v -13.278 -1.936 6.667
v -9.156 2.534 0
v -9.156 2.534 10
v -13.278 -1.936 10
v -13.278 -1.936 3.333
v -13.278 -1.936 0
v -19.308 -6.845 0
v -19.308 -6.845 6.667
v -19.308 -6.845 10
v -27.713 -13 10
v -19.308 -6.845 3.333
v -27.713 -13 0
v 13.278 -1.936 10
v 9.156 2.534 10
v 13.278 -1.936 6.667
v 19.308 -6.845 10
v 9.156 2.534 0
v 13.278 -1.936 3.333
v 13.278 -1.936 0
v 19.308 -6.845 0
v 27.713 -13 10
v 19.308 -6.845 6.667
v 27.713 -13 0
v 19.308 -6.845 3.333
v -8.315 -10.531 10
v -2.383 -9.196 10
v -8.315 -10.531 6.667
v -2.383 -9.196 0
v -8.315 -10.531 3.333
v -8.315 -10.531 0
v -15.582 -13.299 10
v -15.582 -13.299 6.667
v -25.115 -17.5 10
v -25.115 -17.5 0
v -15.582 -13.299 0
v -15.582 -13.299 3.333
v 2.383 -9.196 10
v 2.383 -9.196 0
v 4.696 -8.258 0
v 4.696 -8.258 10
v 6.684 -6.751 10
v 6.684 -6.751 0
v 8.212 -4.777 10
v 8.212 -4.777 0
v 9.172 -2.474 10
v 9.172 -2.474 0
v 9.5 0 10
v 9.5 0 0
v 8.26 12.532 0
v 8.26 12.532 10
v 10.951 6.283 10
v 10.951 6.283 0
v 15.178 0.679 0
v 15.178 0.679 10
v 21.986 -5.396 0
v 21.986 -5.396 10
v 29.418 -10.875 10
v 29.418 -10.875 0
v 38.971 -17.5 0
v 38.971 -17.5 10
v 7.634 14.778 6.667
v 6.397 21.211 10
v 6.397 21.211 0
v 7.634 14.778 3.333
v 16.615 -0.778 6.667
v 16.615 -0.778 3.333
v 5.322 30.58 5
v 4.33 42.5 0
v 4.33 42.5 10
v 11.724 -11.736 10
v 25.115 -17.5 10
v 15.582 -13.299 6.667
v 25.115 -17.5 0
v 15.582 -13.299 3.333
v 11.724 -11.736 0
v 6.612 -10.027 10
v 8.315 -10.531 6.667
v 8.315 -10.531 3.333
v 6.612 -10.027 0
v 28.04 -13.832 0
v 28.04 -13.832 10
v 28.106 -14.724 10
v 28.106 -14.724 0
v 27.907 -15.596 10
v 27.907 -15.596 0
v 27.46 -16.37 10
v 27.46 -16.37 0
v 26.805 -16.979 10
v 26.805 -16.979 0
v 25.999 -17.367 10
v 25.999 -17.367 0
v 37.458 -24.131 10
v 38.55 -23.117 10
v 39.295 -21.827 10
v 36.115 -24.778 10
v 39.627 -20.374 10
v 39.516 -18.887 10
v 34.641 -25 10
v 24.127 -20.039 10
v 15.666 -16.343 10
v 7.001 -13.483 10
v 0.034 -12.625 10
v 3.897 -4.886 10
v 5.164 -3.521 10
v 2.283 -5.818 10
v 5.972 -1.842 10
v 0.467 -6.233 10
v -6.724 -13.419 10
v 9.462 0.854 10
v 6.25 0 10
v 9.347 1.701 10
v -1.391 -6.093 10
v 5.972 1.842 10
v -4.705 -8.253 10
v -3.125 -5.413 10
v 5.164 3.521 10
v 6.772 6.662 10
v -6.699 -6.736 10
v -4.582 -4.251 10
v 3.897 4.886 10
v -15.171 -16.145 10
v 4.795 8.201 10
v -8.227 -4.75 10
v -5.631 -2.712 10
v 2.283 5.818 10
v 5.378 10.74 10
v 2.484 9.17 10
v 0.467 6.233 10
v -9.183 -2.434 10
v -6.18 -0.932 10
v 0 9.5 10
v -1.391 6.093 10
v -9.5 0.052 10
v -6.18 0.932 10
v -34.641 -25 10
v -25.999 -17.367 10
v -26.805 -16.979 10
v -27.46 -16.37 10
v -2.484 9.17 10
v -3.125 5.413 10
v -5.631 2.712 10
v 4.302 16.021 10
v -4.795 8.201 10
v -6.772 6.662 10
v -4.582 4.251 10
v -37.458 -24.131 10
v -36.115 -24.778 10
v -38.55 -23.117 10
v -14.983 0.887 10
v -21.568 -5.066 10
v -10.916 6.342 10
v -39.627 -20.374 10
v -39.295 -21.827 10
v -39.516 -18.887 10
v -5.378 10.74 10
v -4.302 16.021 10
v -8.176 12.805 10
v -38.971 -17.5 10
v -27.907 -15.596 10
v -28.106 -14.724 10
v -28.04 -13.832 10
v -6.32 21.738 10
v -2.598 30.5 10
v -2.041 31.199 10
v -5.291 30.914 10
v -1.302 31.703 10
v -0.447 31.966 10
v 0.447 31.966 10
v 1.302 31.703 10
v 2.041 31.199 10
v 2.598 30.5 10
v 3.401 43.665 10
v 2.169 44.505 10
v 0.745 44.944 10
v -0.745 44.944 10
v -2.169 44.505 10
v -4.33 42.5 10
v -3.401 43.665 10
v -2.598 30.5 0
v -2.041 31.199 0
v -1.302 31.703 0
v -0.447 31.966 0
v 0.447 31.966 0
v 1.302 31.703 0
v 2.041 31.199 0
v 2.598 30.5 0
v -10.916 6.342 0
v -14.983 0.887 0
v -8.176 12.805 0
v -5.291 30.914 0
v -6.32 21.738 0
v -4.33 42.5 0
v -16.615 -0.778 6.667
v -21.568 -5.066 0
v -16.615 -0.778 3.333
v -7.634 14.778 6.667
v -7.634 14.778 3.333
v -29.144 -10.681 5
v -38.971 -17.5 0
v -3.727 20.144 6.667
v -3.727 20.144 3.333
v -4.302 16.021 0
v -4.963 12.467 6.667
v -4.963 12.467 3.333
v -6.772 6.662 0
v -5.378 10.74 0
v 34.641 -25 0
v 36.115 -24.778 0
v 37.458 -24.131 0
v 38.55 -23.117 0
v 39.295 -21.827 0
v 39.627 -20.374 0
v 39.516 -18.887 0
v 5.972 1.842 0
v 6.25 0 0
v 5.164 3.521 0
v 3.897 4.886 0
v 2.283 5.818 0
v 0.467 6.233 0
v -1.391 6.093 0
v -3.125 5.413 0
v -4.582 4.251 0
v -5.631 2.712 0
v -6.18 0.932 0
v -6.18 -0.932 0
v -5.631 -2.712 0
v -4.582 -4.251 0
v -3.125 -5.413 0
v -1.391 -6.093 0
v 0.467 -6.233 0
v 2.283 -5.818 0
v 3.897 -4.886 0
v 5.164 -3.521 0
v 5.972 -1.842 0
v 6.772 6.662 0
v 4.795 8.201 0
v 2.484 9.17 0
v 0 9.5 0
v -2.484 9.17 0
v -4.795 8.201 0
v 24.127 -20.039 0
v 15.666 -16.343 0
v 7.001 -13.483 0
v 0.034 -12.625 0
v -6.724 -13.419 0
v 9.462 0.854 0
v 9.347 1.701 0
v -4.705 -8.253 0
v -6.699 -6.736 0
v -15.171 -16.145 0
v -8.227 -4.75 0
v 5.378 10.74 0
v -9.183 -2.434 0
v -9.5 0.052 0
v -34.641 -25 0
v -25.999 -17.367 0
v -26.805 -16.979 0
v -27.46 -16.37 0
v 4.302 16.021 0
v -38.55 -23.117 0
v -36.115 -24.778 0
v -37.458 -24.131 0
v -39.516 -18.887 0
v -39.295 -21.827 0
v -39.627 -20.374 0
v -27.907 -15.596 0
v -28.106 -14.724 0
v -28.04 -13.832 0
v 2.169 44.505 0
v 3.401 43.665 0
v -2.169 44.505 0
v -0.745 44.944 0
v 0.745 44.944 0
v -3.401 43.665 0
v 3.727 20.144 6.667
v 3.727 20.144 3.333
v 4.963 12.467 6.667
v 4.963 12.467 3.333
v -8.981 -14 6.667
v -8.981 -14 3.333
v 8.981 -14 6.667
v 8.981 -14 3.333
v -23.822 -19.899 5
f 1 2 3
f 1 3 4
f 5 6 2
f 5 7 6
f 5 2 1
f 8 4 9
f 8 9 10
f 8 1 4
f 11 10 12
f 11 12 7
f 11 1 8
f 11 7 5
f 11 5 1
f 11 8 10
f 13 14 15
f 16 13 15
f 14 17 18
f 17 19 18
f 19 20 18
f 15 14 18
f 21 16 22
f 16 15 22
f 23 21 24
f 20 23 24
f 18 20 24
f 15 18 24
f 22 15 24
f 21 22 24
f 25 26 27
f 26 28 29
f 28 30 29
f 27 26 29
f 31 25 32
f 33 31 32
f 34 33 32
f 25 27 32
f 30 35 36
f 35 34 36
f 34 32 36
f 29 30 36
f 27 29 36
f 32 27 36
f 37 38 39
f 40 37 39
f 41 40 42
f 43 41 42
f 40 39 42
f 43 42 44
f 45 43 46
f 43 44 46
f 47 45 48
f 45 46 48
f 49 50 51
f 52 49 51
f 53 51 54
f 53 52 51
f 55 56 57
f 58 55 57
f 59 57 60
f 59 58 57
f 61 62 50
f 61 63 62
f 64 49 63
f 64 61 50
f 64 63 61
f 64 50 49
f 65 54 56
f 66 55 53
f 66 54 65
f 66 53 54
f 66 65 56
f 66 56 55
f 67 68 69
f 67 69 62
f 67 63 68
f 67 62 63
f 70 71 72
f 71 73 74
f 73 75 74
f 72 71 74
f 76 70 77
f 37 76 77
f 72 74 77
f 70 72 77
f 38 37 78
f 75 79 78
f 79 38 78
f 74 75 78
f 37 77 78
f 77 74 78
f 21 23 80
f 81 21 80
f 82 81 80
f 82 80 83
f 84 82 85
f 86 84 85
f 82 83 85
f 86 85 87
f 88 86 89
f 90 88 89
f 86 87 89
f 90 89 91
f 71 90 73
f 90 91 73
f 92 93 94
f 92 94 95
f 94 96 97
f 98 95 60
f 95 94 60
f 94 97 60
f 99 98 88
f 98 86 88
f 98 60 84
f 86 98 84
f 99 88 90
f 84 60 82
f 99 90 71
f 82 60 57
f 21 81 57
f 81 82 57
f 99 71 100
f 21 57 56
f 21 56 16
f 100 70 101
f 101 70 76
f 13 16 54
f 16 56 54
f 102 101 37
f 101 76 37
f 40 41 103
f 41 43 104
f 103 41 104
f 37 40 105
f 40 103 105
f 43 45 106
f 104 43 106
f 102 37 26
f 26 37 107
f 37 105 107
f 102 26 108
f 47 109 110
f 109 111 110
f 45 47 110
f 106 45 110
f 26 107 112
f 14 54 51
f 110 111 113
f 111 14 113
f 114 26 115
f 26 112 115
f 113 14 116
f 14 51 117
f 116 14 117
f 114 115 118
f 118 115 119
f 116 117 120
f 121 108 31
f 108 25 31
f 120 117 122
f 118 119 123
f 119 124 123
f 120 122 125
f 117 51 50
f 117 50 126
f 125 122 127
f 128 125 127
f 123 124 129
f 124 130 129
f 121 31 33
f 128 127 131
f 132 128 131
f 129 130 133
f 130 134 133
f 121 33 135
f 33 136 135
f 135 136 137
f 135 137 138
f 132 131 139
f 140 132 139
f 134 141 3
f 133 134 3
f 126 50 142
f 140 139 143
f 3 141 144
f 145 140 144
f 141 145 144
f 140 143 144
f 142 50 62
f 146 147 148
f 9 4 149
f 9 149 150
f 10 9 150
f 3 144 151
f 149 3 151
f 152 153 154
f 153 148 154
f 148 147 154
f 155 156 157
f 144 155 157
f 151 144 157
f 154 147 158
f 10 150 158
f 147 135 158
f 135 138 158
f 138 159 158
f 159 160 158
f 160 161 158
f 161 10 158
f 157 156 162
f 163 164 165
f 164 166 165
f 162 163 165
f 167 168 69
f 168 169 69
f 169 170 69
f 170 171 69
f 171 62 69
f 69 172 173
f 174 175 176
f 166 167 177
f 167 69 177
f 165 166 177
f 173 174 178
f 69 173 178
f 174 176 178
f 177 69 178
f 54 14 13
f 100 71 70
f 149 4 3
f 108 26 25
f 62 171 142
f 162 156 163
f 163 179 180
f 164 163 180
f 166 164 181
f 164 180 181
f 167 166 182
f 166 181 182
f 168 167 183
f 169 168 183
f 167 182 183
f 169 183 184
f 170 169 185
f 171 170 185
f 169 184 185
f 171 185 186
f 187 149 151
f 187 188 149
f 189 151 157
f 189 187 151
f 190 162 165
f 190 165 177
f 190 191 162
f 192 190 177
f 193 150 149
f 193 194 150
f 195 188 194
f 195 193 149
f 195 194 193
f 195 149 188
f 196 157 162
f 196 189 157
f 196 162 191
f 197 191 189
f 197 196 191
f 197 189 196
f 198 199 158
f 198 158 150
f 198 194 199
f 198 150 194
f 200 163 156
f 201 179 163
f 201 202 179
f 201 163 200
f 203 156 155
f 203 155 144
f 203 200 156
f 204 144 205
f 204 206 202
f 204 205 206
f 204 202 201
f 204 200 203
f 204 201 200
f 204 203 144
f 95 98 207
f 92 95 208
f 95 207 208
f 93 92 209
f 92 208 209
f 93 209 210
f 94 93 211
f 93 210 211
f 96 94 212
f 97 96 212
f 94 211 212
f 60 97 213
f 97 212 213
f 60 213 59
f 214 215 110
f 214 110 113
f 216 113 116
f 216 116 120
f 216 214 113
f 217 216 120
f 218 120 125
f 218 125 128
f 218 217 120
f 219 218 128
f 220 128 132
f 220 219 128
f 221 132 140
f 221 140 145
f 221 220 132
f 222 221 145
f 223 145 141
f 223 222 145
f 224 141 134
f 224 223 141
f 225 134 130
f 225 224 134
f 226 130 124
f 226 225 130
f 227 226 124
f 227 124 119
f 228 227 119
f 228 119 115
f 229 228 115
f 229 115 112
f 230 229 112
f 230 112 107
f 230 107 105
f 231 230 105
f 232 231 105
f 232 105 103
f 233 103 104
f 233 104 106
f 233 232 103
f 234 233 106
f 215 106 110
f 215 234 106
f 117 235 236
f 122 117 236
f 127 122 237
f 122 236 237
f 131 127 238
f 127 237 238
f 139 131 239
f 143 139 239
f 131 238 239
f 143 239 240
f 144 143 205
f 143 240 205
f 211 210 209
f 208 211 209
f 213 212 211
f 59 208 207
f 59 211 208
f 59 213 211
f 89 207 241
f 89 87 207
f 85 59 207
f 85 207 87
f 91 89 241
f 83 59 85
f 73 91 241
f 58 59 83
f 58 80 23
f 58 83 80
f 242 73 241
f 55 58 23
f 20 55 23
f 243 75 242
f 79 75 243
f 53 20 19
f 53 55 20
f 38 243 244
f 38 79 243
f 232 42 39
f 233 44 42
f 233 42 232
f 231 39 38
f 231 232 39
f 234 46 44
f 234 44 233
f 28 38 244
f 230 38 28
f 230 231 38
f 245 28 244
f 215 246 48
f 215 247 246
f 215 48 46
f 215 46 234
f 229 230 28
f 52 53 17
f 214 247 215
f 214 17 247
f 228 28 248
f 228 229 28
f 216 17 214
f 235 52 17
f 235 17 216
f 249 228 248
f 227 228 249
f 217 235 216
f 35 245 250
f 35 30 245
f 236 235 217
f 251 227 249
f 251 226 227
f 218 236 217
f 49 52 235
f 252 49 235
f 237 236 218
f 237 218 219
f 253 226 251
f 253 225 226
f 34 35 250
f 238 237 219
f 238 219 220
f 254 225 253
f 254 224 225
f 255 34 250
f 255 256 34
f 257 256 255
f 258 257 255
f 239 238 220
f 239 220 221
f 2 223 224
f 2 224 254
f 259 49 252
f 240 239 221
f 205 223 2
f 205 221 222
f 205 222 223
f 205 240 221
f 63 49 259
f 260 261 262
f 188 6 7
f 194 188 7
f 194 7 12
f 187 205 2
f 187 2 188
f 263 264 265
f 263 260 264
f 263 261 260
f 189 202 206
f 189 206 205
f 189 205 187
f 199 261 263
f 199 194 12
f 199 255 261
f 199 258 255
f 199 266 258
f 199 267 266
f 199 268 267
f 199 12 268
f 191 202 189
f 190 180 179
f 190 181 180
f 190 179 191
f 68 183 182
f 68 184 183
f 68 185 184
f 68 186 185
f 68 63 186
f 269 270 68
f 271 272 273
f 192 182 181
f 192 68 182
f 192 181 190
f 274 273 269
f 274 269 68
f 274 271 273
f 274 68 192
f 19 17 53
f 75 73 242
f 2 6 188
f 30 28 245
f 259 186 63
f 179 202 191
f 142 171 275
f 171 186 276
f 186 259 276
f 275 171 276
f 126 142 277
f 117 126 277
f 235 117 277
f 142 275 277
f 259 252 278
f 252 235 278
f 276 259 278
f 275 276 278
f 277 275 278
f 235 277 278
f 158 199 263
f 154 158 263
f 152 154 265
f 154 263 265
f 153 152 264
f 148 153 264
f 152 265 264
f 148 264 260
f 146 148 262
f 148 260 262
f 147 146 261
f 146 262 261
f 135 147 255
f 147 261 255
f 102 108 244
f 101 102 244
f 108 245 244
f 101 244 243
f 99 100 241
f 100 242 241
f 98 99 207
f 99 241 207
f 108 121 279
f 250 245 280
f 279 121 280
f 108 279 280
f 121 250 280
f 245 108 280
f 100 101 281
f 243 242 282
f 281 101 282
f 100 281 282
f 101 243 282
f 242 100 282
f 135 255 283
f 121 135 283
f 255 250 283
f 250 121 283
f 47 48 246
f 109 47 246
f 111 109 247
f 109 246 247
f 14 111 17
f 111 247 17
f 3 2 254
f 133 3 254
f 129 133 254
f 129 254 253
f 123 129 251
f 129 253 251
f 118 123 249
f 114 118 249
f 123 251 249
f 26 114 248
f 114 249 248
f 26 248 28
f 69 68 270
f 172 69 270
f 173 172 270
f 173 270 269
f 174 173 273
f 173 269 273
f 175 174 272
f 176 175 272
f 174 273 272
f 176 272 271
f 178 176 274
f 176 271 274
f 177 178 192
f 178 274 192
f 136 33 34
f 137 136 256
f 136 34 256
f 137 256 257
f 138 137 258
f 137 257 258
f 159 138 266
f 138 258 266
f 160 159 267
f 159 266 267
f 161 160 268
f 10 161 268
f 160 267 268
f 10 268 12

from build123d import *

# Parameters (mm, degrees)
F0_R     = 6.25
F1_DEPTH = 10


# Not quite as in the source:
# - a feature names something its author has since deleted; it is built from what else it names


with BuildPart() as f1:
    # F0 (on Top) → F1 (new body)
    with BuildSketch(Plane.XY):
        with BuildLine():
            add(Edge.make_bspline(
                [(4.3301272175, 42.4999999798), (7.3612159322, 4.25), (7.3612159322, 4.25), (38.9711430885, -17.5000001821)],
                knots=[0, 0, 0, 0, 69.2820323028, 69.2820323028, 69.2820323028, 69.2820323028], degree=3))
            ThreePointArc((4.3301272175, 42.4999999798), (2.102e-07, 45), (-4.3301268204, 42.5000000202))
            add(Edge.make_bspline(
                [(-38.9711432521, -17.4999998179), (-7.3612159322, 4.25), (-7.3612159322, 4.25), (-4.3301268204, 42.5000000202)],
                knots=[0, 0, 0, 0, 69.2820323028, 69.2820323028, 69.2820323028, 69.2820323028], degree=3))
            ThreePointArc((-38.9711432521, -17.4999998179), (-38.9711432754, -22.4999998179), (-34.6410162682, -24.9999998382))
            add(Edge.make_bspline(
                [(-34.6410162682, -24.9999998382), (0, -8.5), (0, -8.5), (34.6410160346, -25.0000001618)],
                knots=[0, 0, 0, 0, 69.2820323028, 69.2820323028, 69.2820323028, 69.2820323028], degree=3))
            ThreePointArc((34.6410160346, -25.0000001618), (38.9711430652, -22.5000001821), (38.9711430885, -17.5000001821))
        make_face()
        with BuildLine():
            ThreePointArc((6.7724364928, 6.6621395926), (8.2272413629, 4.7499999534), (9.1558004059, 2.5340321482))
            add(Edge.make_bspline(
                [(9.1558004059, 2.5340321482), (12.4794508791, -1.9849209314), (17.9661663578, -5.9523055453), (27.7128128343, -13.0000001849)],
                knots=[28.2758618531, 28.2758618531, 28.2758618531, 28.2758618531, 50.2294734195, 50.2294734195, 50.2294734195, 50.2294734195], degree=3))
            ThreePointArc((27.7128128343, -13.0000001849), (27.7128128143, -16.0000001849), (25.114736593, -17.5000001676))
            add(Edge.make_bspline(
                [(25.114736593, -17.5000001676), (14.1379308325, -12.5830038779), (7.9587172847, -9.8150611129), (2.3833638843, -9.1961718446)],
                knots=[0, 0, 0, 0, 21.953611623, 21.953611623, 21.953611623, 21.953611623], degree=3))
            ThreePointArc((2.3833638843, -9.1961718446), (-5.39e-08, -9.5), (-2.3833639886, -9.1961718175))
            add(Edge.make_bspline(
                [(-2.3833639886, -9.1961718175), (-7.9587173906, -9.8150610209), (-14.1379309923, -12.5830037018), (-25.1147368265, -17.4999998324)],
                knots=[28.2758618531, 28.2758618531, 28.2758618531, 28.2758618531, 50.2294734195, 50.2294734195, 50.2294734195, 50.2294734195], degree=3))
            ThreePointArc((-25.1147368265, -17.4999998324), (-27.7128130279, -15.9999998151), (-27.7128130079, -12.9999998151))
            add(Edge.make_bspline(
                [(-9.1558003771, 2.534032252), (-12.4794509058, -1.9849207937), (-17.9661664304, -5.9523053189), (-27.7128130079, -12.9999998151)],
                knots=[28.2758617965, 28.2758617965, 28.2758617965, 28.2758617965, 50.2294734195, 50.2294734195, 50.2294734195, 50.2294734195], degree=3))
            ThreePointArc((-9.1558003771, 2.534032252), (-8.227241309, 4.7500000466), (-6.7724364173, 6.6621396694))
            add(Edge.make_bspline(
                [(-2.5980760078, 30.5000000173), (-3.8282353656, 18.5353092472), (-4.5207334885, 11.7999819523), (-6.7724364173, 6.6621396694)],
                knots=[0, 0, 0, 0, 21.9536115664, 21.9536115664, 21.9536115664, 21.9536115664], degree=3))
            ThreePointArc((-2.5980760078, 30.5000000173), (2.136e-07, 32), (2.5980764149, 30.4999999827))
            add(Edge.make_bspline(
                [(2.5980764149, 30.4999999827), (3.8282355979, 18.5353091968), (4.5207336211, 11.7999819066), (6.7724364928, 6.6621395926)],
                knots=[0, 0, 0, 0, 21.953611623, 21.953611623, 21.953611623, 21.953611623], degree=3))
        make_face(mode=Mode.SUBTRACT)
        with BuildLine():
            add(Edge.make_bspline(
                [(6.7724364928, 6.6621395926), (7.4208869274, 5.1825322592), (8.1986480984, 3.8354103774), (9.1558004059, 2.5340321482)],
                knots=[21.953611623, 21.953611623, 21.953611623, 21.953611623, 28.2758618531, 28.2758618531, 28.2758618531, 28.2758618531], degree=3))
            ThreePointArc((9.1558004059, 2.5340321482), (8.2272413629, 4.7499999534), (6.7724364928, 6.6621395926))
        make_face()
        with BuildLine():
            ThreePointArc((-2.3833639886, -9.1961718175), (-5.39e-08, -9.5), (2.3833638843, -9.1961718446))
            add(Edge.make_bspline(
                [(2.3833638843, -9.1961718446), (0.7777611287, -9.0179427274), (-0.7777612284, -9.0179427186), (-2.3833639886, -9.1961718175)],
                knots=[21.953611623, 21.953611623, 21.953611623, 21.953611623, 28.2758618531, 28.2758618531, 28.2758618531, 28.2758618531], degree=3))
        make_face()
        with BuildLine():
            add(Edge.make_bspline(
                [(-6.7724364173, 6.6621396694), (-7.42088687, 5.1825323411), (-8.1986480561, 3.8354104682), (-9.1558003771, 2.534032252)],
                knots=[21.9536115664, 21.9536115664, 21.9536115664, 21.9536115664, 28.2758617965, 28.2758617965, 28.2758617965, 28.2758617965], degree=3))
            ThreePointArc((-6.7724364173, 6.6621396694), (-8.227241309, 4.7500000466), (-9.1558003771, 2.534032252))
        make_face()
        with BuildLine():
            ThreePointArc((2.3833638843, -9.1961718446), (7.5130538698, -5.814122595), (9.5, 0))
            ThreePointArc((9.5, 0), (9.413556816, 1.2786508797), (9.1558004059, 2.5340321482))
            add(Edge.make_bspline(
                [(6.7724364928, 6.6621395926), (7.4208869274, 5.1825322592), (8.1986480984, 3.8354103774), (9.1558004059, 2.5340321482)],
                knots=[21.953611623, 21.953611623, 21.953611623, 21.953611623, 28.2758618531, 28.2758618531, 28.2758618531, 28.2758618531], degree=3))
            ThreePointArc((6.7724364928, 6.6621395926), (5.39e-08, 9.5), (-6.7724364173, 6.6621396694))
            add(Edge.make_bspline(
                [(-6.7724364173, 6.6621396694), (-7.42088687, 5.1825323411), (-8.1986480561, 3.8354104682), (-9.1558003771, 2.534032252)],
                knots=[21.9536115664, 21.9536115664, 21.9536115664, 21.9536115664, 28.2758617965, 28.2758617965, 28.2758617965, 28.2758617965], degree=3))
            ThreePointArc((-9.1558003771, 2.534032252), (-8.2272413629, -4.7499999534), (-2.3833639886, -9.1961718175))
            add(Edge.make_bspline(
                [(2.3833638843, -9.1961718446), (0.7777611287, -9.0179427274), (-0.7777612284, -9.0179427186), (-2.3833639886, -9.1961718175)],
                knots=[21.953611623, 21.953611623, 21.953611623, 21.953611623, 28.2758618531, 28.2758618531, 28.2758618531, 28.2758618531], degree=3))
        make_face()
        Circle(F0_R, mode=Mode.SUBTRACT)
    extrude(amount=F1_DEPTH)


solid = f1.part
